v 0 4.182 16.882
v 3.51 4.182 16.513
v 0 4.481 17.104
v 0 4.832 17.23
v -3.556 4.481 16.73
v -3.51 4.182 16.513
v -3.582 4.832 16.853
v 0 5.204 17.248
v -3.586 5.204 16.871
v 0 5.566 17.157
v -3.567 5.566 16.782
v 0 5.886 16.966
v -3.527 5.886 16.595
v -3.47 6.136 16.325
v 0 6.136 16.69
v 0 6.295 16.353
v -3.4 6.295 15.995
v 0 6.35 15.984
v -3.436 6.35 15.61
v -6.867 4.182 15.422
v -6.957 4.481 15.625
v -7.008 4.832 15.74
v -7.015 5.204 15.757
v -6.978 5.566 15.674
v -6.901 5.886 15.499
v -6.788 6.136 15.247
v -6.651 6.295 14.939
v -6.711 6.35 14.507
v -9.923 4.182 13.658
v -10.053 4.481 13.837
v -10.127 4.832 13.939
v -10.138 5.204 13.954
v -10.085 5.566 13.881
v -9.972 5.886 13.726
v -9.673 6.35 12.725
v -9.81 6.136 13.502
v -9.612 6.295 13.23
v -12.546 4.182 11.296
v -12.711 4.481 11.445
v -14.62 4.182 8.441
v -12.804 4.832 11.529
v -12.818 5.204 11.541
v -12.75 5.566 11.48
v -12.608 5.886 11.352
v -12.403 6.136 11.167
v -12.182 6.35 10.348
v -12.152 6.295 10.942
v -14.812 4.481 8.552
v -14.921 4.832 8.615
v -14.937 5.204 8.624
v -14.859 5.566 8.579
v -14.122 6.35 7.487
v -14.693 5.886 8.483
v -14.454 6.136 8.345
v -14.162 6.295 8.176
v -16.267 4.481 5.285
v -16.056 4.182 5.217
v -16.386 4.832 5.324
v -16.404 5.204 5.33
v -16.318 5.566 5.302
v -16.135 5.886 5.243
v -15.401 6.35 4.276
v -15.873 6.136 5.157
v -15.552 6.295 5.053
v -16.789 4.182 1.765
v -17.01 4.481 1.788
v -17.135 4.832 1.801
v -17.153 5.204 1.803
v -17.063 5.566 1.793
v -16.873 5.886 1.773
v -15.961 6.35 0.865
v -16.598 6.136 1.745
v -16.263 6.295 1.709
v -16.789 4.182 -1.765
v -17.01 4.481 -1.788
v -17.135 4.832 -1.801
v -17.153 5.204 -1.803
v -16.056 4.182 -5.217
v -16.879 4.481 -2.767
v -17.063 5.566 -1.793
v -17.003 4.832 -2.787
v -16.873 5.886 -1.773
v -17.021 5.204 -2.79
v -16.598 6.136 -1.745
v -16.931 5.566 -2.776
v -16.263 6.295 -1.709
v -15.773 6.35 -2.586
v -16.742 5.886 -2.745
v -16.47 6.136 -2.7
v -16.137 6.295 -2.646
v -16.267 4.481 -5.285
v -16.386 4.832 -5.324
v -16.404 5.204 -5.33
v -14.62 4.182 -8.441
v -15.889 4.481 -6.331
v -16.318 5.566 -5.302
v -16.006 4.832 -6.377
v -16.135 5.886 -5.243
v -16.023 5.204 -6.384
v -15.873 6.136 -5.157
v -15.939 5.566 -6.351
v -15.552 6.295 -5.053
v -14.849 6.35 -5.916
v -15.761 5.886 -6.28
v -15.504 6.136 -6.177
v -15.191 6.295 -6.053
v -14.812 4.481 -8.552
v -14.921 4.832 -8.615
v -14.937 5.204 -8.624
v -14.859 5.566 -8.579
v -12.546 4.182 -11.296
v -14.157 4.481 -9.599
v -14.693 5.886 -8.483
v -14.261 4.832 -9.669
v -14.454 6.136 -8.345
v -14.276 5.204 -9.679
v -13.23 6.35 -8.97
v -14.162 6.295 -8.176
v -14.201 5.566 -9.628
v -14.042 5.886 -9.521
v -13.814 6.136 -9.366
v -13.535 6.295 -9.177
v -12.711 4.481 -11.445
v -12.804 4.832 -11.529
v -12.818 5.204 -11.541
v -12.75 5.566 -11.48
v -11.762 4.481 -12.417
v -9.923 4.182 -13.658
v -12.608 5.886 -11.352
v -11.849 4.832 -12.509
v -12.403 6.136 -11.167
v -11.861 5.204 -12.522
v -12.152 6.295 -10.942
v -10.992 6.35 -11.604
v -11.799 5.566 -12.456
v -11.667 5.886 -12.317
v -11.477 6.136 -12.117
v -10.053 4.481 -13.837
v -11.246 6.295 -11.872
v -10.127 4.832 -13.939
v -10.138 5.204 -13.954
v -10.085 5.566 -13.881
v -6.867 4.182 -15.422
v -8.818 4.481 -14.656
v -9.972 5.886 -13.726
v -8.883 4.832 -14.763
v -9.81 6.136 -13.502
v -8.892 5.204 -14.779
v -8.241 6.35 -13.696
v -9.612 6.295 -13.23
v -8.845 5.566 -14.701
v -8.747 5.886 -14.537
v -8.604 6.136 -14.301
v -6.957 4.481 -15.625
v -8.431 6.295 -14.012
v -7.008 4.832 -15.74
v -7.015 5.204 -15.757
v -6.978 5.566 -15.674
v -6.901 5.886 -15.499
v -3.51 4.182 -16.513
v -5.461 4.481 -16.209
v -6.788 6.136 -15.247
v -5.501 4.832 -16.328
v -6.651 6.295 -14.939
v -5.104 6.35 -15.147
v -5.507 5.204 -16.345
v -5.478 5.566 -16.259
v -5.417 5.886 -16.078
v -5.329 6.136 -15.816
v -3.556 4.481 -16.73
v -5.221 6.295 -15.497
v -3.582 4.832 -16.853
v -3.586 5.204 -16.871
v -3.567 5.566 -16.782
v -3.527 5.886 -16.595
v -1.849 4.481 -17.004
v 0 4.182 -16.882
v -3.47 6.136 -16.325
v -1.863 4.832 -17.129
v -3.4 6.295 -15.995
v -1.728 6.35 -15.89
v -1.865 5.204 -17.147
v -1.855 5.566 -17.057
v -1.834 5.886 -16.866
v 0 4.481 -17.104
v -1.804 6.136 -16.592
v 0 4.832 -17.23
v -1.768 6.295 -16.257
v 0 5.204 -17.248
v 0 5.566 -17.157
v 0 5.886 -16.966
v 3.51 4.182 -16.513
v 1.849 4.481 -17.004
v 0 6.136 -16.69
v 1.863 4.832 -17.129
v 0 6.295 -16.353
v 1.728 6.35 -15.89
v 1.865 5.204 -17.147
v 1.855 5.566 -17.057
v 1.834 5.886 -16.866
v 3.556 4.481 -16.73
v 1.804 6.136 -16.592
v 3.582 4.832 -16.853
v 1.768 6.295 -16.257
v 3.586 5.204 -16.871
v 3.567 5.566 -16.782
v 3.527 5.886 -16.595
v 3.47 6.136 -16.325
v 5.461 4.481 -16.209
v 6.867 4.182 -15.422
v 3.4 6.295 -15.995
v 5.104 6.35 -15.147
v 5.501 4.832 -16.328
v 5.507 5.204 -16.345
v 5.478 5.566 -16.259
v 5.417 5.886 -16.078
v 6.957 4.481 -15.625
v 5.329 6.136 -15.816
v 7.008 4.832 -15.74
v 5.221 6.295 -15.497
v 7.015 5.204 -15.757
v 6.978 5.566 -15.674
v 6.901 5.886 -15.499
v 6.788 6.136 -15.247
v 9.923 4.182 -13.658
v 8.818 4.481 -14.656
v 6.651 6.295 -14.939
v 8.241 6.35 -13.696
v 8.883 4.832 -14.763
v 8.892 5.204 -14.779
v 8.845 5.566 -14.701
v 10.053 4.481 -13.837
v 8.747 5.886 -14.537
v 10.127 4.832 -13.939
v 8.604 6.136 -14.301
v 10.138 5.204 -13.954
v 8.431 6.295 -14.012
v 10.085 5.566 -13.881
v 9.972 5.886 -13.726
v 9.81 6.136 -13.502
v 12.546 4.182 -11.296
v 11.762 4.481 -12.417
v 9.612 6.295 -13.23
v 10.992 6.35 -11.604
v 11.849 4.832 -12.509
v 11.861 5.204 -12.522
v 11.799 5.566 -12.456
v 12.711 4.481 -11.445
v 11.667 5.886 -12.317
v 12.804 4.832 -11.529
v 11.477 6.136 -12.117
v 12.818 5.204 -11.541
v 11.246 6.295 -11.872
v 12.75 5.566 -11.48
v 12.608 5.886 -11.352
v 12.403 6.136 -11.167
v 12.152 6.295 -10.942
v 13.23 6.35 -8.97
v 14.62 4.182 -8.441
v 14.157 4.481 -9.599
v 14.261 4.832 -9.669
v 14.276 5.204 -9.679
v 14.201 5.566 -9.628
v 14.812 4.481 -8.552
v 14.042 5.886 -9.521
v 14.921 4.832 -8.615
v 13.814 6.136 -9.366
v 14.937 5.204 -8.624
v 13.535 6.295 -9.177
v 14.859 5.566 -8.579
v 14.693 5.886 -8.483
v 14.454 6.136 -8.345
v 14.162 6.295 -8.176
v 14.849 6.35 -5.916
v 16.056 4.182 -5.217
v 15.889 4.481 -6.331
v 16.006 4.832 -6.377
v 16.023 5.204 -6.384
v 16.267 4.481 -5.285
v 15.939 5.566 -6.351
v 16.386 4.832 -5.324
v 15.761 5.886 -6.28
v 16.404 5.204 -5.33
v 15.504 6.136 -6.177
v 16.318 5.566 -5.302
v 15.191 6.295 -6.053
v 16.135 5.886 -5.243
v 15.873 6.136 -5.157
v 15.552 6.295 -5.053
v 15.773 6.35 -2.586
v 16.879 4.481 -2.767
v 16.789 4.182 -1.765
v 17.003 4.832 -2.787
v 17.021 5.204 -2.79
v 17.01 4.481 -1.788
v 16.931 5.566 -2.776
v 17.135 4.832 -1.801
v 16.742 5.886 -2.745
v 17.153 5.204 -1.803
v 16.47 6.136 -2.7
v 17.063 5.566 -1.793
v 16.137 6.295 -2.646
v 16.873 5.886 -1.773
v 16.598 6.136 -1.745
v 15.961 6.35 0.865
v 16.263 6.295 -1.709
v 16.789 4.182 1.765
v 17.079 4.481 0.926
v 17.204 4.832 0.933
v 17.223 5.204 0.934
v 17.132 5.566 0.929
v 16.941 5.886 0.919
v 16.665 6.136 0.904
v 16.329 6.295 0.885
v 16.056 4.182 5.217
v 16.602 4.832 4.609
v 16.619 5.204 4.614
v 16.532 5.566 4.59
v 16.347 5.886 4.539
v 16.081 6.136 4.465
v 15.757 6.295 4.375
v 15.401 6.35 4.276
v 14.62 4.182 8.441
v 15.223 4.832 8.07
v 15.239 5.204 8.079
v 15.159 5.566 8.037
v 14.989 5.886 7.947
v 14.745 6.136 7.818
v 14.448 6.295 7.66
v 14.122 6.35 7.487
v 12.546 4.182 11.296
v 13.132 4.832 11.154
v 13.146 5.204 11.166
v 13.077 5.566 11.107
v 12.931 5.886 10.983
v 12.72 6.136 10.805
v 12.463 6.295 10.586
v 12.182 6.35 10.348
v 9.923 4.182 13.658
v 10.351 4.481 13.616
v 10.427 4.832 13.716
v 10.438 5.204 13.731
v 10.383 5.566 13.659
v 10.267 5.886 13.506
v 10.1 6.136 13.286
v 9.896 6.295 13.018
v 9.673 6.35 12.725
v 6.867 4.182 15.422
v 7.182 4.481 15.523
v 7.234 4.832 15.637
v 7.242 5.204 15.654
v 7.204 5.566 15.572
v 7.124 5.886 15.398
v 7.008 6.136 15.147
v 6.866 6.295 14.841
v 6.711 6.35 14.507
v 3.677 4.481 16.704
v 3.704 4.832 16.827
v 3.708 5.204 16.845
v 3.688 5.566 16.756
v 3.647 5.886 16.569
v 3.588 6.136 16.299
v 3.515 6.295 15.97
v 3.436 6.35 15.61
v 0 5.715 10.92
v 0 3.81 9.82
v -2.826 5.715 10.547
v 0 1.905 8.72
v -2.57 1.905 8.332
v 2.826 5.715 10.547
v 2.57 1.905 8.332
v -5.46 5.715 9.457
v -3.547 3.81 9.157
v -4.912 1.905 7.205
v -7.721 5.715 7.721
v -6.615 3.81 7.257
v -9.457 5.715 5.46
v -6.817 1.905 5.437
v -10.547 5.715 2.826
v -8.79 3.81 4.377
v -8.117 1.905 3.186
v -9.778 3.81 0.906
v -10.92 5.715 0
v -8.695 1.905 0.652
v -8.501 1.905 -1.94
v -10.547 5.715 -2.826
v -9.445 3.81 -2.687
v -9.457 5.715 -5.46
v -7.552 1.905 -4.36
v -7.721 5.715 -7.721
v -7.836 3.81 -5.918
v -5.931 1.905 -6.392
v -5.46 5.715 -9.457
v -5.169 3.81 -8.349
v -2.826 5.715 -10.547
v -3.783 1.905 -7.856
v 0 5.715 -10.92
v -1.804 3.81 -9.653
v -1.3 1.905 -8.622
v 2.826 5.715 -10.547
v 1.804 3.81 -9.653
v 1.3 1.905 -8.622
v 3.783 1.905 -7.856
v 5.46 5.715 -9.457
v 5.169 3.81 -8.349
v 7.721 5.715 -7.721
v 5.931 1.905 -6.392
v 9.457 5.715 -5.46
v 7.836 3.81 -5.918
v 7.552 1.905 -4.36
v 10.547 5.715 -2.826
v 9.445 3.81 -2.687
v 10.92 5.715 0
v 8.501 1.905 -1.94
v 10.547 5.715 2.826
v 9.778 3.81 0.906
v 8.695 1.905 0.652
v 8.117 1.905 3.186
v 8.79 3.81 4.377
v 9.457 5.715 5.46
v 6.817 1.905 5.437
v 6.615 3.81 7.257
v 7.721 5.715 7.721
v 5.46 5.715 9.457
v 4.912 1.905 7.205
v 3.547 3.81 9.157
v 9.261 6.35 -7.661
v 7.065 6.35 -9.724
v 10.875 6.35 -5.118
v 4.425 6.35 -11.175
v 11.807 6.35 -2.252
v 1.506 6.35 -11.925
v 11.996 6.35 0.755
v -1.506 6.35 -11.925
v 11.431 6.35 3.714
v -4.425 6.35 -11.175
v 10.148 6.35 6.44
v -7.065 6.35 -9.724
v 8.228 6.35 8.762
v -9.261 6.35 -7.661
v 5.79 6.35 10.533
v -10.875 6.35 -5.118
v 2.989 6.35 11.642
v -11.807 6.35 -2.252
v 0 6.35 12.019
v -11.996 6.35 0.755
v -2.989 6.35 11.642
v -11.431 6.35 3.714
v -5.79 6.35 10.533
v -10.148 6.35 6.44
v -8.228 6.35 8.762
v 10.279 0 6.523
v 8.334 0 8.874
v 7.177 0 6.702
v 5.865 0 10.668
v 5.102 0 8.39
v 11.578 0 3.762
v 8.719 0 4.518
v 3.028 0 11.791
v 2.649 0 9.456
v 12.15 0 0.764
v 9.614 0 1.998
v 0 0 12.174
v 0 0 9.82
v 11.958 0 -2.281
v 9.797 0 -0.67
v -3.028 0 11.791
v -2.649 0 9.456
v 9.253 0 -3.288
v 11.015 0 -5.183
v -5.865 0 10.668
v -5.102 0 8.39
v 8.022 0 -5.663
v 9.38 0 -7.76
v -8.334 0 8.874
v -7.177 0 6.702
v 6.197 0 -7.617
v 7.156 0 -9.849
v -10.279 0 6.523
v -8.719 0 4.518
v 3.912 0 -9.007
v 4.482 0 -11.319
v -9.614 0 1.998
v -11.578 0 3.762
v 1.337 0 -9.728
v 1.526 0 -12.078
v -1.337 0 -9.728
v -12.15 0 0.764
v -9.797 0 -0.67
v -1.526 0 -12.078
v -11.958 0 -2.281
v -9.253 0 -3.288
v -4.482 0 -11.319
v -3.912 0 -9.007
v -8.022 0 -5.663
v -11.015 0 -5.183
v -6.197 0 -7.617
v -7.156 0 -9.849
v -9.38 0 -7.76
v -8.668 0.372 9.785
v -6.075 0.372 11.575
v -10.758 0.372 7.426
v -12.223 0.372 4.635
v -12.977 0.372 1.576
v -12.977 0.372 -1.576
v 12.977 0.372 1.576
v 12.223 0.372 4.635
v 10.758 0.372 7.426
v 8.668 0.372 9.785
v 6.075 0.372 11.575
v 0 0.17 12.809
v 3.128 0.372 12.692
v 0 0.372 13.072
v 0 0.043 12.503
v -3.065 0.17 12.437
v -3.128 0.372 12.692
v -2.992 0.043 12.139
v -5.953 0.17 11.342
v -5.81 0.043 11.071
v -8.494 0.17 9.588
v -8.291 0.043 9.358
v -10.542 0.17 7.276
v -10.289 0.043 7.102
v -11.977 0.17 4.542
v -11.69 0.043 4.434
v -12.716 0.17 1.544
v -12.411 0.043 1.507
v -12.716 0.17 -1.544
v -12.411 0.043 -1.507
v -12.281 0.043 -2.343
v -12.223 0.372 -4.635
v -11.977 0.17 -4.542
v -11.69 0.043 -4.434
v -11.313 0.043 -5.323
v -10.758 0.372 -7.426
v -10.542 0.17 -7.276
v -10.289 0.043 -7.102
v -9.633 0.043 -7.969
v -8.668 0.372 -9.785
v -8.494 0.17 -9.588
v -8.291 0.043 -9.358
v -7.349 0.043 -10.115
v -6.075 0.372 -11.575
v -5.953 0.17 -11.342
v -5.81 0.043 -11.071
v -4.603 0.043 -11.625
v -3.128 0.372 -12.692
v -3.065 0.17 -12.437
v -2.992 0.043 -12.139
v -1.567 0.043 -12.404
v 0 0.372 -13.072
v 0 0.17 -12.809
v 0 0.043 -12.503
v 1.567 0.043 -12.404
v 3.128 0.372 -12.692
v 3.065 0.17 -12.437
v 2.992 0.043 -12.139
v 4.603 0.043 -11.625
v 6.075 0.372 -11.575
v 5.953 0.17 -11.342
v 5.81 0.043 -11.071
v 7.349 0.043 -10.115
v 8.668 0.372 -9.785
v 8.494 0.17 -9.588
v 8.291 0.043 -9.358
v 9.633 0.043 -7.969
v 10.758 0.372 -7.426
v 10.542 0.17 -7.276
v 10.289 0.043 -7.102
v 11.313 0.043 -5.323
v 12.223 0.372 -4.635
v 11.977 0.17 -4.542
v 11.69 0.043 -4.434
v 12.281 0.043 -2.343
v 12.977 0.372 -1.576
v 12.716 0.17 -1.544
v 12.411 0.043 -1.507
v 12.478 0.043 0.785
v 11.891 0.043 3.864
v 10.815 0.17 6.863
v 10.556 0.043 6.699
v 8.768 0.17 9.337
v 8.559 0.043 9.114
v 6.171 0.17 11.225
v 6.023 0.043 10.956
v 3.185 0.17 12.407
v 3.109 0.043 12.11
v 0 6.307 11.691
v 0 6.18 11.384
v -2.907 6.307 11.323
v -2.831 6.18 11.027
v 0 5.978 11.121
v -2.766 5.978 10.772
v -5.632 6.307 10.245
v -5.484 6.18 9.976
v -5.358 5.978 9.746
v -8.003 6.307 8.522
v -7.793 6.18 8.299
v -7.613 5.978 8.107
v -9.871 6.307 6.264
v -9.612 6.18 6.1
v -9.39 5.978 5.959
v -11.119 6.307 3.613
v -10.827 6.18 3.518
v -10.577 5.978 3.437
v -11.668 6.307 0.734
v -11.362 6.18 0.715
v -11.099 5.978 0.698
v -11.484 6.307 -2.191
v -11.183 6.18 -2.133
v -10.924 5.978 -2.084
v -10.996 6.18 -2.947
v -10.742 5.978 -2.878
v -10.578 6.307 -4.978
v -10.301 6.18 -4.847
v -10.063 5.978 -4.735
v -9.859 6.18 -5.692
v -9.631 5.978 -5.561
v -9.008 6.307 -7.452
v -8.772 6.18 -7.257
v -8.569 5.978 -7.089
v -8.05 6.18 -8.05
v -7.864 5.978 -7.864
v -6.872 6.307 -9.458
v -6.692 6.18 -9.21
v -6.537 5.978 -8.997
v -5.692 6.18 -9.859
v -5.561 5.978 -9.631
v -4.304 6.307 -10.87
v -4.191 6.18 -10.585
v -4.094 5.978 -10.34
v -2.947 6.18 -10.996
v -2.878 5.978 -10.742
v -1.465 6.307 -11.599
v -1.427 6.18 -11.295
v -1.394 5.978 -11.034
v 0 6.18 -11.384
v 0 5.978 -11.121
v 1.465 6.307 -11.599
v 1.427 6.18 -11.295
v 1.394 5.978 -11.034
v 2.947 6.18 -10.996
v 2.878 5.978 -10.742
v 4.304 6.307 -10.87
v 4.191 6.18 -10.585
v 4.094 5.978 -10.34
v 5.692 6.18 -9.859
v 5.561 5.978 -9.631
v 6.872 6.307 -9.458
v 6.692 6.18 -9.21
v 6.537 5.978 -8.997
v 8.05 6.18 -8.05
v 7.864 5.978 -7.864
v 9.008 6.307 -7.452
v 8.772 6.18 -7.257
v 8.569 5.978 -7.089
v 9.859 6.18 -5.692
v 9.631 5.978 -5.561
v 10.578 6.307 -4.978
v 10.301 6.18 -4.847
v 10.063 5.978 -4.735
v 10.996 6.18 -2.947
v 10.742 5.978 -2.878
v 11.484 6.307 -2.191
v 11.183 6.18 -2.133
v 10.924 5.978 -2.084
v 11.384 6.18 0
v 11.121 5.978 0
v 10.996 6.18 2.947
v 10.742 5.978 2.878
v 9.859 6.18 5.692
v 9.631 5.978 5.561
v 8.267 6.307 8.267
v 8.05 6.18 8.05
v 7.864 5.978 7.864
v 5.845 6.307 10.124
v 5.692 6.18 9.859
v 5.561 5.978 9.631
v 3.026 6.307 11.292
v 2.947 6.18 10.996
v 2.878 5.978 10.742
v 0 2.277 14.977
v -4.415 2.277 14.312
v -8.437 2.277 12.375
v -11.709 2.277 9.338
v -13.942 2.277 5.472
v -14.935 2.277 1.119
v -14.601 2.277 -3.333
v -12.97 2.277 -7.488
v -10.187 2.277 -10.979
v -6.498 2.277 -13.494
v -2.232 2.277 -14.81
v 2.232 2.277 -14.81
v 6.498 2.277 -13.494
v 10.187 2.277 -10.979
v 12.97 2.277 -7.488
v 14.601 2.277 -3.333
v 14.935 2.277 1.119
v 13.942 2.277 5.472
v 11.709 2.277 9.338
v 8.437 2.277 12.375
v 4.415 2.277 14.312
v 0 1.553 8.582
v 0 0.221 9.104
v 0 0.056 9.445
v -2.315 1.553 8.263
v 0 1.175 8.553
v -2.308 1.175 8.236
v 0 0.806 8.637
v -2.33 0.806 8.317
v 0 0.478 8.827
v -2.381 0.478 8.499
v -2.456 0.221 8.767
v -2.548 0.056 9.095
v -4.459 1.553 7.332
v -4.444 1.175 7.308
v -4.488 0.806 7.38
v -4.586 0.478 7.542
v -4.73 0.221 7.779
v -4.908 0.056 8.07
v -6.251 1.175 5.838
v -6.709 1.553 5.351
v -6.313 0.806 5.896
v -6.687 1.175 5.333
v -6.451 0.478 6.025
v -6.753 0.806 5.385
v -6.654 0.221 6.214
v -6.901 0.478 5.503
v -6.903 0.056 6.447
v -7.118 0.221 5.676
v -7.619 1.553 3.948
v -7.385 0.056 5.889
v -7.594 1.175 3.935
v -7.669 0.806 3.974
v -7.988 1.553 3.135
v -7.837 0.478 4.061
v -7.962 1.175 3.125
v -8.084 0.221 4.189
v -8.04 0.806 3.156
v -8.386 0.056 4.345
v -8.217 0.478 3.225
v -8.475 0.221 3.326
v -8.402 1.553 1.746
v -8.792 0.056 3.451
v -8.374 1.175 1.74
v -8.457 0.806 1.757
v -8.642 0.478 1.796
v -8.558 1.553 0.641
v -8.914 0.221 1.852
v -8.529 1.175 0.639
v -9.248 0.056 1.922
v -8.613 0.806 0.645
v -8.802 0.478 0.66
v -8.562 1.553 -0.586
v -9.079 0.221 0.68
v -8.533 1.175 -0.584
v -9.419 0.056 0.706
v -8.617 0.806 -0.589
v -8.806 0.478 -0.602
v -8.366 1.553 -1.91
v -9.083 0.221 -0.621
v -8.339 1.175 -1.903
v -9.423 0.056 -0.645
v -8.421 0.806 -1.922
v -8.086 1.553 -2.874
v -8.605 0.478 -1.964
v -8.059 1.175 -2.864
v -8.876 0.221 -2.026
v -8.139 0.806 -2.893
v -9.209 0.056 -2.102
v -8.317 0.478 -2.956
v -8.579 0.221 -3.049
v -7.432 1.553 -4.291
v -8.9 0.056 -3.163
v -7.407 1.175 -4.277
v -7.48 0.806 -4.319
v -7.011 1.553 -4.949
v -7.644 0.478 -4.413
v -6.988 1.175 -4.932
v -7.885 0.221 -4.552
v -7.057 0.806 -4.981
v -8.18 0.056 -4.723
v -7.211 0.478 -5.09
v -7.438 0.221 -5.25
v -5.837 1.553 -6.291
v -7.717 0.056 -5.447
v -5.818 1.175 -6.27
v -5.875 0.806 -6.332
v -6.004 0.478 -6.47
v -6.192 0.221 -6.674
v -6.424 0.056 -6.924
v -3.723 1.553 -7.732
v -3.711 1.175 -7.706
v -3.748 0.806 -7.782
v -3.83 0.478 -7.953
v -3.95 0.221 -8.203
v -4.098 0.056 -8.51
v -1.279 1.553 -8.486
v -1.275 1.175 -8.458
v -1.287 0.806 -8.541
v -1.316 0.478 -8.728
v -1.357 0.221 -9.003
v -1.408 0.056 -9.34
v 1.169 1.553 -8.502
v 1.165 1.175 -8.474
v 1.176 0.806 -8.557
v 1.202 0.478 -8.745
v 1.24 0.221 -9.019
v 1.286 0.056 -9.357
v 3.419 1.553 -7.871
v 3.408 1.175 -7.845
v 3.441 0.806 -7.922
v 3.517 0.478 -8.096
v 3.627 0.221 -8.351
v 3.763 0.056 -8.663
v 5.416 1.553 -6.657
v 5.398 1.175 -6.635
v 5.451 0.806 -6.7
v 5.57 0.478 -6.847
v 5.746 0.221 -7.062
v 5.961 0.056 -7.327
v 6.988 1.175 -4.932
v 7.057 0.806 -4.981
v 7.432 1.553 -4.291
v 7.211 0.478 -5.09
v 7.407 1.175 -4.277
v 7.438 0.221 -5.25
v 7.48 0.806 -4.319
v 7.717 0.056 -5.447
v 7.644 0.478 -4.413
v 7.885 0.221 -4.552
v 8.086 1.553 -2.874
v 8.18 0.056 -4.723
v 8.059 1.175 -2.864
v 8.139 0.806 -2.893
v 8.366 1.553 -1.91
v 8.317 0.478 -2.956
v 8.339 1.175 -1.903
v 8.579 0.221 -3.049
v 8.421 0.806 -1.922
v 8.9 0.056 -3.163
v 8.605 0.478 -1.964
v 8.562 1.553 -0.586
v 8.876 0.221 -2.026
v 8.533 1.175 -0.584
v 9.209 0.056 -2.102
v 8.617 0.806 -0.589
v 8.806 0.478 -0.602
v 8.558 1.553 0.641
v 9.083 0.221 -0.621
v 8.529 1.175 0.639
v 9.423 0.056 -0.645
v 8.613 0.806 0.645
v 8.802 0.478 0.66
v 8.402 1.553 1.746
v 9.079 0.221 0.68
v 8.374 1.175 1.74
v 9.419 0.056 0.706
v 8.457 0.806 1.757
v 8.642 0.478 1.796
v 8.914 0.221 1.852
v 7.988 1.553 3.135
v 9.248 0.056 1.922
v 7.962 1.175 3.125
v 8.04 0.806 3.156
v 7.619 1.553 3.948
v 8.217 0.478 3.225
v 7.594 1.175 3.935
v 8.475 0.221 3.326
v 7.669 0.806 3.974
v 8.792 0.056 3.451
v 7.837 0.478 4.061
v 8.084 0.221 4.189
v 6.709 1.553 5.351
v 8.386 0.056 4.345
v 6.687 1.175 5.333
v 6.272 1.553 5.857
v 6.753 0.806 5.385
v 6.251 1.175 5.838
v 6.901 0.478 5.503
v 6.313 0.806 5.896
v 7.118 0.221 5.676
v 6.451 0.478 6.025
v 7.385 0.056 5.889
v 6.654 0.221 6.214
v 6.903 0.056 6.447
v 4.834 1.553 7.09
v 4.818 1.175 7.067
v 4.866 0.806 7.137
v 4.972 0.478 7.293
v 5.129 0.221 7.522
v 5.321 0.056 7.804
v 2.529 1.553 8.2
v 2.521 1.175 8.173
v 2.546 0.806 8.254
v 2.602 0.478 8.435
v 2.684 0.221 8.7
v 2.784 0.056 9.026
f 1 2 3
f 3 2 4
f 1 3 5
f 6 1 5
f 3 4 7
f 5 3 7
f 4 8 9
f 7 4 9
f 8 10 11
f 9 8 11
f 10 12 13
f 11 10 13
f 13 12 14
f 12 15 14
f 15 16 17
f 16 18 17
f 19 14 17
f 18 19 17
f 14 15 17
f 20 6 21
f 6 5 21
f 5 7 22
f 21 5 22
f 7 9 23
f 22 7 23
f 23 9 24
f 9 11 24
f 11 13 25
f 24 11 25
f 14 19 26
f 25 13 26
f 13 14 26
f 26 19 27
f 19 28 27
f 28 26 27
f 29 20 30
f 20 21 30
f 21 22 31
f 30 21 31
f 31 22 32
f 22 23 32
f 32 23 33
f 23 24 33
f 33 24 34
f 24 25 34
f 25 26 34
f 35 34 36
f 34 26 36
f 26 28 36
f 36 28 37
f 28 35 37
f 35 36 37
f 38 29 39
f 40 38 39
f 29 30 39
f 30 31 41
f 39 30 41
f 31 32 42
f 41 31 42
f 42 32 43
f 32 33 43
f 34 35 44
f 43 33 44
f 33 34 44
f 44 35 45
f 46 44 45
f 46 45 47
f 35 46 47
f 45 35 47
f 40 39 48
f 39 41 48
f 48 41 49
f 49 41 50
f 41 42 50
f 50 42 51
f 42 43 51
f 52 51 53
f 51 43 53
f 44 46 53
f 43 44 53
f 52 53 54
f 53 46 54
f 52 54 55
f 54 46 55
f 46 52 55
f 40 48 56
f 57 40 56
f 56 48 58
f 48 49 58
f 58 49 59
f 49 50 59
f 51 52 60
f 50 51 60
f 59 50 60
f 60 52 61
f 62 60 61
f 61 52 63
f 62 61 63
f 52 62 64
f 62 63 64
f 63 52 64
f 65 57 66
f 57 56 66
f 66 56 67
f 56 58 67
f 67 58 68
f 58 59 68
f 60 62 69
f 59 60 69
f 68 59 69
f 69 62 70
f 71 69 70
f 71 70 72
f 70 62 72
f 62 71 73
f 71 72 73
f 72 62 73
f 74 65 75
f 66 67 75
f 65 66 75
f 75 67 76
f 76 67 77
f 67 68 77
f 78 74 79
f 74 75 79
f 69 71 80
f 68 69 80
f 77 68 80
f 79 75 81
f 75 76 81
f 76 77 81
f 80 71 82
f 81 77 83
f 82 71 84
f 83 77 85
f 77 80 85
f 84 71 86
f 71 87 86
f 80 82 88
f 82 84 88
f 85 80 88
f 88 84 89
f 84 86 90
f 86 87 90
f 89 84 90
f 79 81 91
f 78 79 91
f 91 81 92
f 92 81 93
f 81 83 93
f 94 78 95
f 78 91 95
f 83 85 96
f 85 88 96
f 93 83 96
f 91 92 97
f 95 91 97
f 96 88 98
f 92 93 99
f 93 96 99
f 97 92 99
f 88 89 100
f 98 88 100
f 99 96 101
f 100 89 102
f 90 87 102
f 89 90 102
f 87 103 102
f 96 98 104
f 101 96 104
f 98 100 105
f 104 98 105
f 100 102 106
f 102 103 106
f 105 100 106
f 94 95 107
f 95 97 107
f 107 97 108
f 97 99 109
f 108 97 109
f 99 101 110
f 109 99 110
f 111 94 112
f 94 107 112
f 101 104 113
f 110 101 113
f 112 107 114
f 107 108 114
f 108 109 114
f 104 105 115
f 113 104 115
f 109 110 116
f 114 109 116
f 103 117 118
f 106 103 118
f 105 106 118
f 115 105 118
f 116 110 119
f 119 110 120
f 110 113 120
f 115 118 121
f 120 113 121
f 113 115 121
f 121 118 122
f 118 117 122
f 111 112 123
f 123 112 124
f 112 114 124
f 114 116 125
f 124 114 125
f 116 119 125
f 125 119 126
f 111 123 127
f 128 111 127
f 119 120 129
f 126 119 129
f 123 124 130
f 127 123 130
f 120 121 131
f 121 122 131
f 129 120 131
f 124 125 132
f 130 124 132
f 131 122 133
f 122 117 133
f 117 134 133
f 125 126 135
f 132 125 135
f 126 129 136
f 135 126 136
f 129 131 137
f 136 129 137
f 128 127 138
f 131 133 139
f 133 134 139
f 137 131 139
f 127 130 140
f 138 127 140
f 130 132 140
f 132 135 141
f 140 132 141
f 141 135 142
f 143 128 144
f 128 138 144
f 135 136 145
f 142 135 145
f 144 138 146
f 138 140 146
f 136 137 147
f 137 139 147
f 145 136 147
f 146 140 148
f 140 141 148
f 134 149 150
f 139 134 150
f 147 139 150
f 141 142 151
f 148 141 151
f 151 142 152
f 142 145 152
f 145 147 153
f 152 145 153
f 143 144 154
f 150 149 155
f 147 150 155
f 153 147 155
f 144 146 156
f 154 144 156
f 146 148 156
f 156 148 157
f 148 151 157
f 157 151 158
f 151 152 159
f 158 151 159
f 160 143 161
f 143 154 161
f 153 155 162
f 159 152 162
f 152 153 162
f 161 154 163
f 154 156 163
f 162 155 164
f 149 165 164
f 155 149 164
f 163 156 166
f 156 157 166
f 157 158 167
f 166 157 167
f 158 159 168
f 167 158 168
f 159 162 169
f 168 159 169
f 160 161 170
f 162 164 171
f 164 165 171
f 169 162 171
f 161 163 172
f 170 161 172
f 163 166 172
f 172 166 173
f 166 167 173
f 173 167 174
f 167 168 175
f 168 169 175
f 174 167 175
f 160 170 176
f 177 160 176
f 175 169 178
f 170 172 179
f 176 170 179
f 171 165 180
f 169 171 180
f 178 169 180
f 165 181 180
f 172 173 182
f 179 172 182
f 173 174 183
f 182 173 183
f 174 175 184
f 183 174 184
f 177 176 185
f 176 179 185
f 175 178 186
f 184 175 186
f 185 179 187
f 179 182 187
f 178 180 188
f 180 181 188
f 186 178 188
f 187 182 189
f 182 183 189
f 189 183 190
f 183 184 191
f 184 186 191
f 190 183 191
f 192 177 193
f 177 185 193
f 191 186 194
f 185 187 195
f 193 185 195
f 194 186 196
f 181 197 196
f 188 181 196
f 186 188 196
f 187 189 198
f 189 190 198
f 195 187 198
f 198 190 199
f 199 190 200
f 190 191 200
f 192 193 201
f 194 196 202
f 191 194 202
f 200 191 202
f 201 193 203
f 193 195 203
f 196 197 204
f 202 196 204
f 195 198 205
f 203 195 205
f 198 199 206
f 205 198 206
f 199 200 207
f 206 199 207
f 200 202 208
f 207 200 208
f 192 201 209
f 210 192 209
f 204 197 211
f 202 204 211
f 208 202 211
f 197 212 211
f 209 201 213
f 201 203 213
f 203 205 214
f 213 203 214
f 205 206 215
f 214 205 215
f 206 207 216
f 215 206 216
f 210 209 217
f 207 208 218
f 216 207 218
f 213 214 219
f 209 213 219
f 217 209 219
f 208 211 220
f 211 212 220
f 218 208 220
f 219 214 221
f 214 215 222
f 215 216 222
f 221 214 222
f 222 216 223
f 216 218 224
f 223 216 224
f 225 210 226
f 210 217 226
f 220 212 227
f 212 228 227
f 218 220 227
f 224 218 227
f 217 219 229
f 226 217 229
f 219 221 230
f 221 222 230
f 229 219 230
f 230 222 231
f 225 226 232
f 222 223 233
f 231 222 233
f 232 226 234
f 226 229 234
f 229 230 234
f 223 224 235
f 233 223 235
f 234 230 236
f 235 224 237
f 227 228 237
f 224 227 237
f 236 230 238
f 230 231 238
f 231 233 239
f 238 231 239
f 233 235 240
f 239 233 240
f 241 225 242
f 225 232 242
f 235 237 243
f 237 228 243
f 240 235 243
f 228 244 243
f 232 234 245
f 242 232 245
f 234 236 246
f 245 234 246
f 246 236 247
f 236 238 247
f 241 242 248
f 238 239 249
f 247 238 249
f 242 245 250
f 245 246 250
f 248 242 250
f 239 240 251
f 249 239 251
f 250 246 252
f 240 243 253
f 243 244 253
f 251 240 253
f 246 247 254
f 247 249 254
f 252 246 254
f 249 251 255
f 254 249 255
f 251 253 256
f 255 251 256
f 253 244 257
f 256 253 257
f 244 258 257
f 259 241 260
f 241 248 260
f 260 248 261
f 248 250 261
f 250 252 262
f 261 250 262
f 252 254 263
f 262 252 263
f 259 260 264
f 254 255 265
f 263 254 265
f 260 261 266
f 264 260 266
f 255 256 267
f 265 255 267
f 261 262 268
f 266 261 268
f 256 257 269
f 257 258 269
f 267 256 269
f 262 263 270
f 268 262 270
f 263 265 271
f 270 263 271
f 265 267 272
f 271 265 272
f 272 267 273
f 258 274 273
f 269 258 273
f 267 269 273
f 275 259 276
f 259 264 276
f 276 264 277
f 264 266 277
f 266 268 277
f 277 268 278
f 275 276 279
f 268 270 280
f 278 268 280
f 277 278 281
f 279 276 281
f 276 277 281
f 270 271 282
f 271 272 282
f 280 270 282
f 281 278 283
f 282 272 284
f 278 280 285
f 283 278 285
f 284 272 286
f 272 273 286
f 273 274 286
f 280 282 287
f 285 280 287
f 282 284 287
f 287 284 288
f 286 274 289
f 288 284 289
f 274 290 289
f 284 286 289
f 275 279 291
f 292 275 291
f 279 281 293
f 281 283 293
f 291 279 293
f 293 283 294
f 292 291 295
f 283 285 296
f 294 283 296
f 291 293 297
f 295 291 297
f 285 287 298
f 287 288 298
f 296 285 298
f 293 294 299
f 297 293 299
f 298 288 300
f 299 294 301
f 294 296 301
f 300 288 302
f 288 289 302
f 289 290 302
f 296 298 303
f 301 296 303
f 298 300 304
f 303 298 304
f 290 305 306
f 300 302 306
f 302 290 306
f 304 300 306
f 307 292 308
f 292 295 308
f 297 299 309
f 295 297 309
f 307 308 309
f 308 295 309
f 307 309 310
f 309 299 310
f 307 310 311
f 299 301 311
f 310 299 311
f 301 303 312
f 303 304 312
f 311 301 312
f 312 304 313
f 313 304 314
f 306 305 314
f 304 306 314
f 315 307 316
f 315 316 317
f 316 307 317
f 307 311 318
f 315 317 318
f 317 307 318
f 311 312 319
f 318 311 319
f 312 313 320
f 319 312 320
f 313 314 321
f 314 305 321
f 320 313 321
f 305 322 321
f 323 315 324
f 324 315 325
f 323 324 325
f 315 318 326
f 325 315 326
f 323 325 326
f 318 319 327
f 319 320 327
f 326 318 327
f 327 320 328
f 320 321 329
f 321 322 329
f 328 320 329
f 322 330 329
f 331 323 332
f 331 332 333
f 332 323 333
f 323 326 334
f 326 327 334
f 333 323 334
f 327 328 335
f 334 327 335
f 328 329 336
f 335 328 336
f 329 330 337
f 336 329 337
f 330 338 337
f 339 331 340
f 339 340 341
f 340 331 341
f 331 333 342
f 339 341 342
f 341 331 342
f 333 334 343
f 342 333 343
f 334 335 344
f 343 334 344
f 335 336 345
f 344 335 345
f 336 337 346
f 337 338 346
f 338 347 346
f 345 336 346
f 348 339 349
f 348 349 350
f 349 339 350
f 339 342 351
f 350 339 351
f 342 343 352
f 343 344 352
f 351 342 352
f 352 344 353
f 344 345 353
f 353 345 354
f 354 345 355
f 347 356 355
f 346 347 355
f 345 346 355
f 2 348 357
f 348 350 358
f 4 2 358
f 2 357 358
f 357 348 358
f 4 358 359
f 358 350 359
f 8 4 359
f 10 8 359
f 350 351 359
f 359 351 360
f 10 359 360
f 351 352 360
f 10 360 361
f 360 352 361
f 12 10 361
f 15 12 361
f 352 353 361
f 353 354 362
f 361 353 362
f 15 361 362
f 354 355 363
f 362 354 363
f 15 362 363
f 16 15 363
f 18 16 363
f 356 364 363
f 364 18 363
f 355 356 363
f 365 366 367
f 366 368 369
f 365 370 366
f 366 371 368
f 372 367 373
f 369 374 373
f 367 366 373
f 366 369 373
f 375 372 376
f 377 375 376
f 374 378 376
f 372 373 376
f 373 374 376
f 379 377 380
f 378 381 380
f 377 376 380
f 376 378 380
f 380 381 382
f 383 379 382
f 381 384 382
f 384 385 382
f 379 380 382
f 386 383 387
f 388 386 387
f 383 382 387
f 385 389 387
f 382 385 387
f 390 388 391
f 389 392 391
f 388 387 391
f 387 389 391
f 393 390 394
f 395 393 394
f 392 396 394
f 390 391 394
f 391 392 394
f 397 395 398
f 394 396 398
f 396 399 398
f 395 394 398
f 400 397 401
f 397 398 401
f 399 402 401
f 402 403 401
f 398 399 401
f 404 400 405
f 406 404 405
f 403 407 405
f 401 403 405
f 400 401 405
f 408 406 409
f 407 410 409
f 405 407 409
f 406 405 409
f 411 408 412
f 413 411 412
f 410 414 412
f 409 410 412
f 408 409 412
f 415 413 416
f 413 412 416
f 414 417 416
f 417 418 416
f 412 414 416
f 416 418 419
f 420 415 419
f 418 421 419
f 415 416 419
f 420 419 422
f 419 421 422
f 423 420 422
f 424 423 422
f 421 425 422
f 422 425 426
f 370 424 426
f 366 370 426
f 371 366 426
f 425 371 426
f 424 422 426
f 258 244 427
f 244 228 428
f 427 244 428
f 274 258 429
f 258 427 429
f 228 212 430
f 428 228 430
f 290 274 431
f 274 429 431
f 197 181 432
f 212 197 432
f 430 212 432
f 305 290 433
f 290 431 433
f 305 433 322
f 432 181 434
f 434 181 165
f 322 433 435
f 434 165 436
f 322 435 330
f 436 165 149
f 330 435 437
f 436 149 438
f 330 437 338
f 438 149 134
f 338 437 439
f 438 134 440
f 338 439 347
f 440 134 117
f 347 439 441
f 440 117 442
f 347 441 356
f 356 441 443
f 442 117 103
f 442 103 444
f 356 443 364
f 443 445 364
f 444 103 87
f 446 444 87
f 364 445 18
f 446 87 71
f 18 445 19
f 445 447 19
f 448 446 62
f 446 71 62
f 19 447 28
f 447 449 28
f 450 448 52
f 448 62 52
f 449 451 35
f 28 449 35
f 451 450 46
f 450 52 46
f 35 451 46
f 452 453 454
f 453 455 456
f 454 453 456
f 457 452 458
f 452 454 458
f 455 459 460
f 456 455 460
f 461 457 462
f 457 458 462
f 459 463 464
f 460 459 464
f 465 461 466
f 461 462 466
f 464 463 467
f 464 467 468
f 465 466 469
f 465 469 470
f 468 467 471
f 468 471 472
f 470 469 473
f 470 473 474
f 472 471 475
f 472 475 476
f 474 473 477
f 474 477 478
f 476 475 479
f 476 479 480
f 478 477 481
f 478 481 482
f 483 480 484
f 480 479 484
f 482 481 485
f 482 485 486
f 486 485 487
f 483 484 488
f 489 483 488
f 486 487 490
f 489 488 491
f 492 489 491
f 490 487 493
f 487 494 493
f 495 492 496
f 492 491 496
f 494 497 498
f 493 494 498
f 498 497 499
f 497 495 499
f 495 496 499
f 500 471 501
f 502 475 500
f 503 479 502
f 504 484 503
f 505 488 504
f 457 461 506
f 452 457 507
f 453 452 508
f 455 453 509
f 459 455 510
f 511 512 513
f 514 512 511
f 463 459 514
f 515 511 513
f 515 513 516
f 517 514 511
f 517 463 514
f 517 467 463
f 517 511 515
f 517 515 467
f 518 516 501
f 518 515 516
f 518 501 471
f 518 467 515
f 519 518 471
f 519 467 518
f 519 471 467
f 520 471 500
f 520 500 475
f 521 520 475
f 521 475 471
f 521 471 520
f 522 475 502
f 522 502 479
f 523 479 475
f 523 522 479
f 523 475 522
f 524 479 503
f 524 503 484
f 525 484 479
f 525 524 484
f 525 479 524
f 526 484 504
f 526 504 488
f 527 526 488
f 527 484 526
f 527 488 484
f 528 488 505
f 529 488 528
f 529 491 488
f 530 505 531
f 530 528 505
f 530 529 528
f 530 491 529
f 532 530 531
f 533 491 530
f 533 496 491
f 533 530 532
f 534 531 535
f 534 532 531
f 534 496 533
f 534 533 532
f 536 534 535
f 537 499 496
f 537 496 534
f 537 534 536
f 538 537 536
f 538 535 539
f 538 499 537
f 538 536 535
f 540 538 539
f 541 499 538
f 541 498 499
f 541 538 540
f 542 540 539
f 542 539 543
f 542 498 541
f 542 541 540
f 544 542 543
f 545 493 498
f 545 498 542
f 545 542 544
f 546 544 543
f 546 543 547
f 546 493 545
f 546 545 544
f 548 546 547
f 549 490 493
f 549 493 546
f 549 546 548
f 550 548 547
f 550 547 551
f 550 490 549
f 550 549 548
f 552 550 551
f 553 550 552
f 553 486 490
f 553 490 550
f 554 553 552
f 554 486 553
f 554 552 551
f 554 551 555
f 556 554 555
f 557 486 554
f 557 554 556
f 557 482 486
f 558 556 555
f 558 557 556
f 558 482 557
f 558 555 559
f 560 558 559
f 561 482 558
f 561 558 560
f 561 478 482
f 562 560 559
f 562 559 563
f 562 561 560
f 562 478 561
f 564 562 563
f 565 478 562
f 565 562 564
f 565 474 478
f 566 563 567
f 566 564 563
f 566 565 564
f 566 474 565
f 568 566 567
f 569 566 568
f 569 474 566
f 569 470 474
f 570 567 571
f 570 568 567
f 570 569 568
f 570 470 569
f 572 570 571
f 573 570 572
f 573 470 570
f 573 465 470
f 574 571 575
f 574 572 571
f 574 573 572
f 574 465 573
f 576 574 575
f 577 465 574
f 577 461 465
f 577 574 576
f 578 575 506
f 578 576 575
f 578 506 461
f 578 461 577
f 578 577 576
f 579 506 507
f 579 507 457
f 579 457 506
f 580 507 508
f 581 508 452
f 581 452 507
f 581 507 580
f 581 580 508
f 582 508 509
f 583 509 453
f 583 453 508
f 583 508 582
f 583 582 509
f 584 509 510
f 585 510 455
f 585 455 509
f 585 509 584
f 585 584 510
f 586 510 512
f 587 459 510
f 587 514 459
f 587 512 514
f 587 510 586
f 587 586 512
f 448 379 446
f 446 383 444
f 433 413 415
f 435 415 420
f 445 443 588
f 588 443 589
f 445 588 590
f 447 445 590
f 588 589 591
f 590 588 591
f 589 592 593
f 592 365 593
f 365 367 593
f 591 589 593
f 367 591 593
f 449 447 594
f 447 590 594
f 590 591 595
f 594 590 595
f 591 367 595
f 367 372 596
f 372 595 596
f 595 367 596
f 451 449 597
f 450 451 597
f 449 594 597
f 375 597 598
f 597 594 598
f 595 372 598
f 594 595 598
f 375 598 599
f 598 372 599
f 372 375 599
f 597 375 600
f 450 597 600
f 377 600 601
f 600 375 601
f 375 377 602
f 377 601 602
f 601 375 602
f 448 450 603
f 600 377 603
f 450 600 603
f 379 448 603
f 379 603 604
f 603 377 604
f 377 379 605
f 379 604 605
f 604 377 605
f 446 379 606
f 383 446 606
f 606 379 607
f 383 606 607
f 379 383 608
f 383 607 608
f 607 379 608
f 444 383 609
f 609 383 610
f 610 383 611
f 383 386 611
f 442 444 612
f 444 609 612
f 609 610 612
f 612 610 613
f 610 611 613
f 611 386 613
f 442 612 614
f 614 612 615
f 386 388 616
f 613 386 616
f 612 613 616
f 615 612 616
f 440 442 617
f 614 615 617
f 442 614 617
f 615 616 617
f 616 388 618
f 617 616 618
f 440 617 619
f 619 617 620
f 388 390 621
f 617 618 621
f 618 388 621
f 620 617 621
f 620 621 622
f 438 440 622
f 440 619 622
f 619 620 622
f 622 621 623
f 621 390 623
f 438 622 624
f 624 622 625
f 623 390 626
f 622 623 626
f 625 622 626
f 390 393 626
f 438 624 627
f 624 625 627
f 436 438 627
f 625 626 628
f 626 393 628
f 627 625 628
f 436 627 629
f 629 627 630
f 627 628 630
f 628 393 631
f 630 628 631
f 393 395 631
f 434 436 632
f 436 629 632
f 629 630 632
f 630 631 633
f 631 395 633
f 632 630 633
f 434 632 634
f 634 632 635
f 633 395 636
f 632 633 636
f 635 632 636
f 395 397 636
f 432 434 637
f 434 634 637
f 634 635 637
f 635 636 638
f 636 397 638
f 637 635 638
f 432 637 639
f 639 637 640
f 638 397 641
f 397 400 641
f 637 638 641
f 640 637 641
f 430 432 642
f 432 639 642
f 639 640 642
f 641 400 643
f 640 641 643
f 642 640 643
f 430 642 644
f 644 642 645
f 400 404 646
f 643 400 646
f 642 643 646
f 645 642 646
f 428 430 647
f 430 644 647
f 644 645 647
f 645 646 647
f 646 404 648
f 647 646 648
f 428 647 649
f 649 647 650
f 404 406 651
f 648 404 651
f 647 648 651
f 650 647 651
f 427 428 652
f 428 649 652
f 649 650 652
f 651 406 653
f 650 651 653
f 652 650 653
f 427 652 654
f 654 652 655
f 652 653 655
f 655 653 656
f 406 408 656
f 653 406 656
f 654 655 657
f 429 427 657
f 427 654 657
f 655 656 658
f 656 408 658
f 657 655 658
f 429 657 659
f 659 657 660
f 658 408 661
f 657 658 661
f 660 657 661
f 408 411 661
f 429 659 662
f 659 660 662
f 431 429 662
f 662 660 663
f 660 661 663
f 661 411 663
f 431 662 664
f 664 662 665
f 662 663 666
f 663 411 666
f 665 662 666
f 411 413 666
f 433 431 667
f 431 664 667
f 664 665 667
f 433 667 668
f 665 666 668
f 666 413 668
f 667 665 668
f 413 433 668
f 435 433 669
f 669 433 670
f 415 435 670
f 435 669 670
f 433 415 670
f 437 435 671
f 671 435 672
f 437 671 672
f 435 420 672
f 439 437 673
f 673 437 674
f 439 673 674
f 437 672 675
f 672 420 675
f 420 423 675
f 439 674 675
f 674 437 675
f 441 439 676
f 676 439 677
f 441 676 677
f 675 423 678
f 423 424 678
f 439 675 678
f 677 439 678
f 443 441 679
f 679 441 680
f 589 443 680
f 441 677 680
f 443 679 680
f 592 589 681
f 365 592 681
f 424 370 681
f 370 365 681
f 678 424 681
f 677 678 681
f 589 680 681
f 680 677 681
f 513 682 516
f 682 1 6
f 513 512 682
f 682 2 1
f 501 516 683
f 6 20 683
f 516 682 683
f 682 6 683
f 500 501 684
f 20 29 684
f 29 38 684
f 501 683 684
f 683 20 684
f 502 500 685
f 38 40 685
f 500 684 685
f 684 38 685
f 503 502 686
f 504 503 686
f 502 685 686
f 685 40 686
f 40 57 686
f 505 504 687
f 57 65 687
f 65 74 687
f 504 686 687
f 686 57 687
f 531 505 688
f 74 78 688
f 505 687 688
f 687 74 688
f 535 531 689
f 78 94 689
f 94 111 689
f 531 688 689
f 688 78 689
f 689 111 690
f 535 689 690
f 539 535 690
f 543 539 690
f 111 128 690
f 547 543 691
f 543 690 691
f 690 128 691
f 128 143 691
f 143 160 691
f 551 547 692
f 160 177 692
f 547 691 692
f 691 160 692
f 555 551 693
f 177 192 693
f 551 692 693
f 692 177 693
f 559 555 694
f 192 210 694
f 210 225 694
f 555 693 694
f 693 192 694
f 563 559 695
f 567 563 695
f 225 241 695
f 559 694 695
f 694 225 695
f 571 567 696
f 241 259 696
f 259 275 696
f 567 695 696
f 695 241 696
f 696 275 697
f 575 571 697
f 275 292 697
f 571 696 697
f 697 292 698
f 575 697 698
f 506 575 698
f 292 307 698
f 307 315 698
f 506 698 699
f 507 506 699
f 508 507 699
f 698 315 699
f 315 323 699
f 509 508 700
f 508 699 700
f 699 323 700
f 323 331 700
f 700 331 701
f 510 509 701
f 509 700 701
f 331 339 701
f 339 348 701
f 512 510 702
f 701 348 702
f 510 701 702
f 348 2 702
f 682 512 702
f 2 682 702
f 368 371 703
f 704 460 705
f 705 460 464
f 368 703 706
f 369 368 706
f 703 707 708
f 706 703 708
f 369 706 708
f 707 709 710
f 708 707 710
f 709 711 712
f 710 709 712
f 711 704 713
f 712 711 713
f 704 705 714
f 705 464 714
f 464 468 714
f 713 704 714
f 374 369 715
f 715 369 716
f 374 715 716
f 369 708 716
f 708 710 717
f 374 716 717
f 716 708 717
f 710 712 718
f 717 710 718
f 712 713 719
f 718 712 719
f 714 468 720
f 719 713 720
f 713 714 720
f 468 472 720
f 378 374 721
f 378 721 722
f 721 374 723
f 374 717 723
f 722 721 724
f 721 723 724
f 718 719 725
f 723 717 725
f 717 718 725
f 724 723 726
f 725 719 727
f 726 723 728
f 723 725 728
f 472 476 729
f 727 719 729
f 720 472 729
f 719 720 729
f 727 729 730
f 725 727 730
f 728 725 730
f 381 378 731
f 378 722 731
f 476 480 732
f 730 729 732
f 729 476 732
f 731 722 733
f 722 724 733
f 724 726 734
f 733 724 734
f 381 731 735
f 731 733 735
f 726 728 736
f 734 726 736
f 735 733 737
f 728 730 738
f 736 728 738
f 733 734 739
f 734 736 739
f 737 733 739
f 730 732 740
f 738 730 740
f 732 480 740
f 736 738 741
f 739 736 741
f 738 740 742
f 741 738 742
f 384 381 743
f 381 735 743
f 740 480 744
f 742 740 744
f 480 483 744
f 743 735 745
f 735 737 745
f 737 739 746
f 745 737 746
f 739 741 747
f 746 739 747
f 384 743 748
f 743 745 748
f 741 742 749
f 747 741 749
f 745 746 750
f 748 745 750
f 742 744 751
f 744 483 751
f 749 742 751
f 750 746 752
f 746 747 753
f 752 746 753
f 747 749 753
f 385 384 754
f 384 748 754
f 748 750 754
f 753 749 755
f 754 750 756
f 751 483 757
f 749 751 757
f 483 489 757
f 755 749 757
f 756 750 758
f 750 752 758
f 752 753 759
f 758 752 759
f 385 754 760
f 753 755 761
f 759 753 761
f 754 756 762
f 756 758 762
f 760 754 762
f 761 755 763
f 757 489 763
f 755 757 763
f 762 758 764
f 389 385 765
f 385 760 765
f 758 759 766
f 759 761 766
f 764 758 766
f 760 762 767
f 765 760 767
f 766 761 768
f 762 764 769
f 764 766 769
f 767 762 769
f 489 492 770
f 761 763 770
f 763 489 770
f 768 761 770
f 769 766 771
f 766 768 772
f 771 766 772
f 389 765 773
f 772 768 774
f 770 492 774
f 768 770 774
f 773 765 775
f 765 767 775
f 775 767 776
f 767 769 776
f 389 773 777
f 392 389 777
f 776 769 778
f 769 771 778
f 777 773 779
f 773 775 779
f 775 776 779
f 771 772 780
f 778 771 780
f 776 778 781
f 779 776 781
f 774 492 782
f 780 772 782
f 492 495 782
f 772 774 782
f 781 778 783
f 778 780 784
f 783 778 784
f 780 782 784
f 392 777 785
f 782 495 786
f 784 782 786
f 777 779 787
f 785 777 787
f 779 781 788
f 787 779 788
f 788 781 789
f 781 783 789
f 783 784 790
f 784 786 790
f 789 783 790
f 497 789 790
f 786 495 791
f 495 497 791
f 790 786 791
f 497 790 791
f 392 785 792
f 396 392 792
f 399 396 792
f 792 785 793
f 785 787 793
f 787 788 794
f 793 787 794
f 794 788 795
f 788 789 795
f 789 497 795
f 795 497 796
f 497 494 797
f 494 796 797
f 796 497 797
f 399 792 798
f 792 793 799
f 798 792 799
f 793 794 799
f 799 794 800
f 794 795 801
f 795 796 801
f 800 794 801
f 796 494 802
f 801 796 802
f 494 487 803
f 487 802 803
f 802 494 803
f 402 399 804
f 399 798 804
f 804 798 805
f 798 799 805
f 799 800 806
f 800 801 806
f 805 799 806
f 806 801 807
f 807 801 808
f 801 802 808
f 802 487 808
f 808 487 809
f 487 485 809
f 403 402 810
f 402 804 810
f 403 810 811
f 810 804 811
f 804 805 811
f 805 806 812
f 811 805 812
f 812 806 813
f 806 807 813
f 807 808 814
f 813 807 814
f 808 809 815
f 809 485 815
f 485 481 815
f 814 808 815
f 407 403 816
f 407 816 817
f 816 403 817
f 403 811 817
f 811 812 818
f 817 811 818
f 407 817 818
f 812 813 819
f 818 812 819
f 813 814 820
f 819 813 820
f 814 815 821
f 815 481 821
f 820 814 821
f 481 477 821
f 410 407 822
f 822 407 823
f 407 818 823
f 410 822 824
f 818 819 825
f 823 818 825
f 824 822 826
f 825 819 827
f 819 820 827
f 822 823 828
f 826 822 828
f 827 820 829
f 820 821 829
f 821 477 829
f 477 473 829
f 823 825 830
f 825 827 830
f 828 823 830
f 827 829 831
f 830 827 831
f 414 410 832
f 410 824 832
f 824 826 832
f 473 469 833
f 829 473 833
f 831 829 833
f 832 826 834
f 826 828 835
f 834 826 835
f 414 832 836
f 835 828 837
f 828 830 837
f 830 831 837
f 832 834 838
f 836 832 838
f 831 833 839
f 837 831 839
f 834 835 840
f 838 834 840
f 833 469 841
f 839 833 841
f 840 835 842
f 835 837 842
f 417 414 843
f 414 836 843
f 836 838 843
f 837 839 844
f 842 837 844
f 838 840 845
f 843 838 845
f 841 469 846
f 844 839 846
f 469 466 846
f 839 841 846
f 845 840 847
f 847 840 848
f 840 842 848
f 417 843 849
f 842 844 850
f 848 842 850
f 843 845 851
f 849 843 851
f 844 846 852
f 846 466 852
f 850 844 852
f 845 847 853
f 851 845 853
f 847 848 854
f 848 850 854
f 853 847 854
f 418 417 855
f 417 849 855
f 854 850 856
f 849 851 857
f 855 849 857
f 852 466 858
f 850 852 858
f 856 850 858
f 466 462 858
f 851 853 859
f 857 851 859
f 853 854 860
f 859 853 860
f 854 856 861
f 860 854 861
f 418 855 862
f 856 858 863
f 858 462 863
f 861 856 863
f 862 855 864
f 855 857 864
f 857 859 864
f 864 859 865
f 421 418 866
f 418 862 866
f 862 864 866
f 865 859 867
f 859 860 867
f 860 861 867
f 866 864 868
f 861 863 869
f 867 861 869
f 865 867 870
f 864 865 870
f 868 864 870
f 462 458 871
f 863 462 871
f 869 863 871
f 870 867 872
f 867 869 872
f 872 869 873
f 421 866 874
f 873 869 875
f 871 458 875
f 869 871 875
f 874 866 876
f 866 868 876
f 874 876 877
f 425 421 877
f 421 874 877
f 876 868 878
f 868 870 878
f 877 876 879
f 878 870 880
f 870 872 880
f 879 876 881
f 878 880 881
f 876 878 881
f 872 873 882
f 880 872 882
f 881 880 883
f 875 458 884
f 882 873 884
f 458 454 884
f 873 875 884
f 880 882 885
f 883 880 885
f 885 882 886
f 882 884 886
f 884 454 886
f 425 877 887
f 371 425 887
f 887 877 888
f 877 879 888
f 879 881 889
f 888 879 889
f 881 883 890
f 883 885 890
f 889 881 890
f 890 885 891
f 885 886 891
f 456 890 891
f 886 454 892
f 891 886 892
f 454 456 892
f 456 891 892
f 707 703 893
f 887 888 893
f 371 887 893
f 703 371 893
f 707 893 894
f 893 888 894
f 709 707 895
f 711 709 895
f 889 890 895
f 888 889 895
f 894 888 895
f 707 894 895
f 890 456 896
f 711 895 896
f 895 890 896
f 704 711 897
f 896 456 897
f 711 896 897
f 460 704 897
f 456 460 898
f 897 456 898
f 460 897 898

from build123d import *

# Parameters (mm, degrees)
FILLET1_R = 1.27


with BuildPart() as part:
    # Sketch1 → Revolve1 (revolve)
    with BuildSketch(Plane.XY, mode=Mode.PRIVATE) as revolve1_sk:
        Polygon((-12.7, 0), (-19.05, 6.35), (-11.286174209, 6.35), (-7.62, 0), align=None)
    revolve(revolve1_sk.sketch.rotate(Axis((0, 6.6675, 0), (0, -1, 0)), 270), axis=Axis((0, 6.6675, 0), (0, -1, 0)))

    # Fillet1
    fillet1_edges = [part.edges().sort_by_distance(p)[0] for p in [
        (0, 0, -12.7),
        (0, 6.35, -19.05),
        (0, 6.35, -11.286174209),
        (0, 0, -7.62),
    ]]
    fillet(fillet1_edges, radius=FILLET1_R)


solid = part.part
